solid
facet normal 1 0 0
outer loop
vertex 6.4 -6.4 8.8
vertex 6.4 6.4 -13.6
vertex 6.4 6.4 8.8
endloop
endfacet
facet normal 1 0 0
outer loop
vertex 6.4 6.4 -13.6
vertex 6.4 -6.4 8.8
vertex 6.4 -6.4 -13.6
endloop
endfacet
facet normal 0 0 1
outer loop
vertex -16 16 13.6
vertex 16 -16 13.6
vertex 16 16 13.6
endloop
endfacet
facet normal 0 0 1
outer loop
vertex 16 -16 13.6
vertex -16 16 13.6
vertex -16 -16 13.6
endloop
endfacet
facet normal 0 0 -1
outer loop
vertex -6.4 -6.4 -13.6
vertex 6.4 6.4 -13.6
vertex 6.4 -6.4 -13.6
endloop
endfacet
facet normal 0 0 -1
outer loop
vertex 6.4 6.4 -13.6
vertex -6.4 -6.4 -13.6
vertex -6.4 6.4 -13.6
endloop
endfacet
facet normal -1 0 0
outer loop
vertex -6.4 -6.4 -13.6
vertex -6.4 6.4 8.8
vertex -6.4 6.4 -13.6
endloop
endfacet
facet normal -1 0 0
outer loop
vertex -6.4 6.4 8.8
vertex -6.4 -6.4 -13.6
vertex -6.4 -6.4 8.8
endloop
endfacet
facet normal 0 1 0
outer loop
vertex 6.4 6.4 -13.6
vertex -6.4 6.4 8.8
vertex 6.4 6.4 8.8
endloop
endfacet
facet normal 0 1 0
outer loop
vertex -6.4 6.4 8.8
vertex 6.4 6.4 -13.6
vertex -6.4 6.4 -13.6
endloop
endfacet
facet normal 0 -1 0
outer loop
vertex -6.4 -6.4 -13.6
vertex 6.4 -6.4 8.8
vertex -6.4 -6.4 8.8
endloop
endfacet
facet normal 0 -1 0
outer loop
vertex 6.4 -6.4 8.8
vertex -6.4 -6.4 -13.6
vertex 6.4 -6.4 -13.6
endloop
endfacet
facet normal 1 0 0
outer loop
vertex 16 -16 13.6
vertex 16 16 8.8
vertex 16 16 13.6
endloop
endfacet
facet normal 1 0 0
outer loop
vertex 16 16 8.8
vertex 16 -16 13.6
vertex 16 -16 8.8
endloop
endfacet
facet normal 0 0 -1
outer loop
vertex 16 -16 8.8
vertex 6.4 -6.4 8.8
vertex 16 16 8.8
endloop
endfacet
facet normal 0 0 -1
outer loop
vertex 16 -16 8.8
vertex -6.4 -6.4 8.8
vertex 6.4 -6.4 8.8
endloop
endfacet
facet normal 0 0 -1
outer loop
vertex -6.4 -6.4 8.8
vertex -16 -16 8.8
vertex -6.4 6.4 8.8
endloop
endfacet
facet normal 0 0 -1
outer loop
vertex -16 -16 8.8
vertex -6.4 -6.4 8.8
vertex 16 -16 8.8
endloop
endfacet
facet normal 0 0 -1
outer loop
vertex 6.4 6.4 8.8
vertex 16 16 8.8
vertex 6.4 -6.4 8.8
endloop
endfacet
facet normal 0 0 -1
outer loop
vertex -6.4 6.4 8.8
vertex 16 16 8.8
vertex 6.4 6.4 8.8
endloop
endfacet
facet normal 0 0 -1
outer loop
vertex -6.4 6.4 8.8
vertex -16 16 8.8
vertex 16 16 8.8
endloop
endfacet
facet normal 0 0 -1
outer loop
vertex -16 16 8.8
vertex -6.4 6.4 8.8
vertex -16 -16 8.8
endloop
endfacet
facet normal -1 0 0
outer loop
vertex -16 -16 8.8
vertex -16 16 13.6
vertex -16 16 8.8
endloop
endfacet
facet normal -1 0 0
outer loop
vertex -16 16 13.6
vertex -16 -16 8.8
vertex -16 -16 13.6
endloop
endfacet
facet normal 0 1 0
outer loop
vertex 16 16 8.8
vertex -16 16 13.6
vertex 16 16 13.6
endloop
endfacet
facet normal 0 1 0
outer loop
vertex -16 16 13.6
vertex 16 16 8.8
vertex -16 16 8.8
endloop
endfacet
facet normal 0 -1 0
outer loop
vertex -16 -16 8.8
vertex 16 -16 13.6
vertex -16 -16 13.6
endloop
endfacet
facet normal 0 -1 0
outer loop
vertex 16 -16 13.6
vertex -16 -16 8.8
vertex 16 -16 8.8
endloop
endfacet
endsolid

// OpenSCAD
size=32; //block=32 //item=8

cube([size*0.4,size*0.4,size*0.85],center=true);	//foot
translate([0,0,size*0.35]){
cube([size*1,size*1,size*0.15],center=true);	//plate
};	//translate
